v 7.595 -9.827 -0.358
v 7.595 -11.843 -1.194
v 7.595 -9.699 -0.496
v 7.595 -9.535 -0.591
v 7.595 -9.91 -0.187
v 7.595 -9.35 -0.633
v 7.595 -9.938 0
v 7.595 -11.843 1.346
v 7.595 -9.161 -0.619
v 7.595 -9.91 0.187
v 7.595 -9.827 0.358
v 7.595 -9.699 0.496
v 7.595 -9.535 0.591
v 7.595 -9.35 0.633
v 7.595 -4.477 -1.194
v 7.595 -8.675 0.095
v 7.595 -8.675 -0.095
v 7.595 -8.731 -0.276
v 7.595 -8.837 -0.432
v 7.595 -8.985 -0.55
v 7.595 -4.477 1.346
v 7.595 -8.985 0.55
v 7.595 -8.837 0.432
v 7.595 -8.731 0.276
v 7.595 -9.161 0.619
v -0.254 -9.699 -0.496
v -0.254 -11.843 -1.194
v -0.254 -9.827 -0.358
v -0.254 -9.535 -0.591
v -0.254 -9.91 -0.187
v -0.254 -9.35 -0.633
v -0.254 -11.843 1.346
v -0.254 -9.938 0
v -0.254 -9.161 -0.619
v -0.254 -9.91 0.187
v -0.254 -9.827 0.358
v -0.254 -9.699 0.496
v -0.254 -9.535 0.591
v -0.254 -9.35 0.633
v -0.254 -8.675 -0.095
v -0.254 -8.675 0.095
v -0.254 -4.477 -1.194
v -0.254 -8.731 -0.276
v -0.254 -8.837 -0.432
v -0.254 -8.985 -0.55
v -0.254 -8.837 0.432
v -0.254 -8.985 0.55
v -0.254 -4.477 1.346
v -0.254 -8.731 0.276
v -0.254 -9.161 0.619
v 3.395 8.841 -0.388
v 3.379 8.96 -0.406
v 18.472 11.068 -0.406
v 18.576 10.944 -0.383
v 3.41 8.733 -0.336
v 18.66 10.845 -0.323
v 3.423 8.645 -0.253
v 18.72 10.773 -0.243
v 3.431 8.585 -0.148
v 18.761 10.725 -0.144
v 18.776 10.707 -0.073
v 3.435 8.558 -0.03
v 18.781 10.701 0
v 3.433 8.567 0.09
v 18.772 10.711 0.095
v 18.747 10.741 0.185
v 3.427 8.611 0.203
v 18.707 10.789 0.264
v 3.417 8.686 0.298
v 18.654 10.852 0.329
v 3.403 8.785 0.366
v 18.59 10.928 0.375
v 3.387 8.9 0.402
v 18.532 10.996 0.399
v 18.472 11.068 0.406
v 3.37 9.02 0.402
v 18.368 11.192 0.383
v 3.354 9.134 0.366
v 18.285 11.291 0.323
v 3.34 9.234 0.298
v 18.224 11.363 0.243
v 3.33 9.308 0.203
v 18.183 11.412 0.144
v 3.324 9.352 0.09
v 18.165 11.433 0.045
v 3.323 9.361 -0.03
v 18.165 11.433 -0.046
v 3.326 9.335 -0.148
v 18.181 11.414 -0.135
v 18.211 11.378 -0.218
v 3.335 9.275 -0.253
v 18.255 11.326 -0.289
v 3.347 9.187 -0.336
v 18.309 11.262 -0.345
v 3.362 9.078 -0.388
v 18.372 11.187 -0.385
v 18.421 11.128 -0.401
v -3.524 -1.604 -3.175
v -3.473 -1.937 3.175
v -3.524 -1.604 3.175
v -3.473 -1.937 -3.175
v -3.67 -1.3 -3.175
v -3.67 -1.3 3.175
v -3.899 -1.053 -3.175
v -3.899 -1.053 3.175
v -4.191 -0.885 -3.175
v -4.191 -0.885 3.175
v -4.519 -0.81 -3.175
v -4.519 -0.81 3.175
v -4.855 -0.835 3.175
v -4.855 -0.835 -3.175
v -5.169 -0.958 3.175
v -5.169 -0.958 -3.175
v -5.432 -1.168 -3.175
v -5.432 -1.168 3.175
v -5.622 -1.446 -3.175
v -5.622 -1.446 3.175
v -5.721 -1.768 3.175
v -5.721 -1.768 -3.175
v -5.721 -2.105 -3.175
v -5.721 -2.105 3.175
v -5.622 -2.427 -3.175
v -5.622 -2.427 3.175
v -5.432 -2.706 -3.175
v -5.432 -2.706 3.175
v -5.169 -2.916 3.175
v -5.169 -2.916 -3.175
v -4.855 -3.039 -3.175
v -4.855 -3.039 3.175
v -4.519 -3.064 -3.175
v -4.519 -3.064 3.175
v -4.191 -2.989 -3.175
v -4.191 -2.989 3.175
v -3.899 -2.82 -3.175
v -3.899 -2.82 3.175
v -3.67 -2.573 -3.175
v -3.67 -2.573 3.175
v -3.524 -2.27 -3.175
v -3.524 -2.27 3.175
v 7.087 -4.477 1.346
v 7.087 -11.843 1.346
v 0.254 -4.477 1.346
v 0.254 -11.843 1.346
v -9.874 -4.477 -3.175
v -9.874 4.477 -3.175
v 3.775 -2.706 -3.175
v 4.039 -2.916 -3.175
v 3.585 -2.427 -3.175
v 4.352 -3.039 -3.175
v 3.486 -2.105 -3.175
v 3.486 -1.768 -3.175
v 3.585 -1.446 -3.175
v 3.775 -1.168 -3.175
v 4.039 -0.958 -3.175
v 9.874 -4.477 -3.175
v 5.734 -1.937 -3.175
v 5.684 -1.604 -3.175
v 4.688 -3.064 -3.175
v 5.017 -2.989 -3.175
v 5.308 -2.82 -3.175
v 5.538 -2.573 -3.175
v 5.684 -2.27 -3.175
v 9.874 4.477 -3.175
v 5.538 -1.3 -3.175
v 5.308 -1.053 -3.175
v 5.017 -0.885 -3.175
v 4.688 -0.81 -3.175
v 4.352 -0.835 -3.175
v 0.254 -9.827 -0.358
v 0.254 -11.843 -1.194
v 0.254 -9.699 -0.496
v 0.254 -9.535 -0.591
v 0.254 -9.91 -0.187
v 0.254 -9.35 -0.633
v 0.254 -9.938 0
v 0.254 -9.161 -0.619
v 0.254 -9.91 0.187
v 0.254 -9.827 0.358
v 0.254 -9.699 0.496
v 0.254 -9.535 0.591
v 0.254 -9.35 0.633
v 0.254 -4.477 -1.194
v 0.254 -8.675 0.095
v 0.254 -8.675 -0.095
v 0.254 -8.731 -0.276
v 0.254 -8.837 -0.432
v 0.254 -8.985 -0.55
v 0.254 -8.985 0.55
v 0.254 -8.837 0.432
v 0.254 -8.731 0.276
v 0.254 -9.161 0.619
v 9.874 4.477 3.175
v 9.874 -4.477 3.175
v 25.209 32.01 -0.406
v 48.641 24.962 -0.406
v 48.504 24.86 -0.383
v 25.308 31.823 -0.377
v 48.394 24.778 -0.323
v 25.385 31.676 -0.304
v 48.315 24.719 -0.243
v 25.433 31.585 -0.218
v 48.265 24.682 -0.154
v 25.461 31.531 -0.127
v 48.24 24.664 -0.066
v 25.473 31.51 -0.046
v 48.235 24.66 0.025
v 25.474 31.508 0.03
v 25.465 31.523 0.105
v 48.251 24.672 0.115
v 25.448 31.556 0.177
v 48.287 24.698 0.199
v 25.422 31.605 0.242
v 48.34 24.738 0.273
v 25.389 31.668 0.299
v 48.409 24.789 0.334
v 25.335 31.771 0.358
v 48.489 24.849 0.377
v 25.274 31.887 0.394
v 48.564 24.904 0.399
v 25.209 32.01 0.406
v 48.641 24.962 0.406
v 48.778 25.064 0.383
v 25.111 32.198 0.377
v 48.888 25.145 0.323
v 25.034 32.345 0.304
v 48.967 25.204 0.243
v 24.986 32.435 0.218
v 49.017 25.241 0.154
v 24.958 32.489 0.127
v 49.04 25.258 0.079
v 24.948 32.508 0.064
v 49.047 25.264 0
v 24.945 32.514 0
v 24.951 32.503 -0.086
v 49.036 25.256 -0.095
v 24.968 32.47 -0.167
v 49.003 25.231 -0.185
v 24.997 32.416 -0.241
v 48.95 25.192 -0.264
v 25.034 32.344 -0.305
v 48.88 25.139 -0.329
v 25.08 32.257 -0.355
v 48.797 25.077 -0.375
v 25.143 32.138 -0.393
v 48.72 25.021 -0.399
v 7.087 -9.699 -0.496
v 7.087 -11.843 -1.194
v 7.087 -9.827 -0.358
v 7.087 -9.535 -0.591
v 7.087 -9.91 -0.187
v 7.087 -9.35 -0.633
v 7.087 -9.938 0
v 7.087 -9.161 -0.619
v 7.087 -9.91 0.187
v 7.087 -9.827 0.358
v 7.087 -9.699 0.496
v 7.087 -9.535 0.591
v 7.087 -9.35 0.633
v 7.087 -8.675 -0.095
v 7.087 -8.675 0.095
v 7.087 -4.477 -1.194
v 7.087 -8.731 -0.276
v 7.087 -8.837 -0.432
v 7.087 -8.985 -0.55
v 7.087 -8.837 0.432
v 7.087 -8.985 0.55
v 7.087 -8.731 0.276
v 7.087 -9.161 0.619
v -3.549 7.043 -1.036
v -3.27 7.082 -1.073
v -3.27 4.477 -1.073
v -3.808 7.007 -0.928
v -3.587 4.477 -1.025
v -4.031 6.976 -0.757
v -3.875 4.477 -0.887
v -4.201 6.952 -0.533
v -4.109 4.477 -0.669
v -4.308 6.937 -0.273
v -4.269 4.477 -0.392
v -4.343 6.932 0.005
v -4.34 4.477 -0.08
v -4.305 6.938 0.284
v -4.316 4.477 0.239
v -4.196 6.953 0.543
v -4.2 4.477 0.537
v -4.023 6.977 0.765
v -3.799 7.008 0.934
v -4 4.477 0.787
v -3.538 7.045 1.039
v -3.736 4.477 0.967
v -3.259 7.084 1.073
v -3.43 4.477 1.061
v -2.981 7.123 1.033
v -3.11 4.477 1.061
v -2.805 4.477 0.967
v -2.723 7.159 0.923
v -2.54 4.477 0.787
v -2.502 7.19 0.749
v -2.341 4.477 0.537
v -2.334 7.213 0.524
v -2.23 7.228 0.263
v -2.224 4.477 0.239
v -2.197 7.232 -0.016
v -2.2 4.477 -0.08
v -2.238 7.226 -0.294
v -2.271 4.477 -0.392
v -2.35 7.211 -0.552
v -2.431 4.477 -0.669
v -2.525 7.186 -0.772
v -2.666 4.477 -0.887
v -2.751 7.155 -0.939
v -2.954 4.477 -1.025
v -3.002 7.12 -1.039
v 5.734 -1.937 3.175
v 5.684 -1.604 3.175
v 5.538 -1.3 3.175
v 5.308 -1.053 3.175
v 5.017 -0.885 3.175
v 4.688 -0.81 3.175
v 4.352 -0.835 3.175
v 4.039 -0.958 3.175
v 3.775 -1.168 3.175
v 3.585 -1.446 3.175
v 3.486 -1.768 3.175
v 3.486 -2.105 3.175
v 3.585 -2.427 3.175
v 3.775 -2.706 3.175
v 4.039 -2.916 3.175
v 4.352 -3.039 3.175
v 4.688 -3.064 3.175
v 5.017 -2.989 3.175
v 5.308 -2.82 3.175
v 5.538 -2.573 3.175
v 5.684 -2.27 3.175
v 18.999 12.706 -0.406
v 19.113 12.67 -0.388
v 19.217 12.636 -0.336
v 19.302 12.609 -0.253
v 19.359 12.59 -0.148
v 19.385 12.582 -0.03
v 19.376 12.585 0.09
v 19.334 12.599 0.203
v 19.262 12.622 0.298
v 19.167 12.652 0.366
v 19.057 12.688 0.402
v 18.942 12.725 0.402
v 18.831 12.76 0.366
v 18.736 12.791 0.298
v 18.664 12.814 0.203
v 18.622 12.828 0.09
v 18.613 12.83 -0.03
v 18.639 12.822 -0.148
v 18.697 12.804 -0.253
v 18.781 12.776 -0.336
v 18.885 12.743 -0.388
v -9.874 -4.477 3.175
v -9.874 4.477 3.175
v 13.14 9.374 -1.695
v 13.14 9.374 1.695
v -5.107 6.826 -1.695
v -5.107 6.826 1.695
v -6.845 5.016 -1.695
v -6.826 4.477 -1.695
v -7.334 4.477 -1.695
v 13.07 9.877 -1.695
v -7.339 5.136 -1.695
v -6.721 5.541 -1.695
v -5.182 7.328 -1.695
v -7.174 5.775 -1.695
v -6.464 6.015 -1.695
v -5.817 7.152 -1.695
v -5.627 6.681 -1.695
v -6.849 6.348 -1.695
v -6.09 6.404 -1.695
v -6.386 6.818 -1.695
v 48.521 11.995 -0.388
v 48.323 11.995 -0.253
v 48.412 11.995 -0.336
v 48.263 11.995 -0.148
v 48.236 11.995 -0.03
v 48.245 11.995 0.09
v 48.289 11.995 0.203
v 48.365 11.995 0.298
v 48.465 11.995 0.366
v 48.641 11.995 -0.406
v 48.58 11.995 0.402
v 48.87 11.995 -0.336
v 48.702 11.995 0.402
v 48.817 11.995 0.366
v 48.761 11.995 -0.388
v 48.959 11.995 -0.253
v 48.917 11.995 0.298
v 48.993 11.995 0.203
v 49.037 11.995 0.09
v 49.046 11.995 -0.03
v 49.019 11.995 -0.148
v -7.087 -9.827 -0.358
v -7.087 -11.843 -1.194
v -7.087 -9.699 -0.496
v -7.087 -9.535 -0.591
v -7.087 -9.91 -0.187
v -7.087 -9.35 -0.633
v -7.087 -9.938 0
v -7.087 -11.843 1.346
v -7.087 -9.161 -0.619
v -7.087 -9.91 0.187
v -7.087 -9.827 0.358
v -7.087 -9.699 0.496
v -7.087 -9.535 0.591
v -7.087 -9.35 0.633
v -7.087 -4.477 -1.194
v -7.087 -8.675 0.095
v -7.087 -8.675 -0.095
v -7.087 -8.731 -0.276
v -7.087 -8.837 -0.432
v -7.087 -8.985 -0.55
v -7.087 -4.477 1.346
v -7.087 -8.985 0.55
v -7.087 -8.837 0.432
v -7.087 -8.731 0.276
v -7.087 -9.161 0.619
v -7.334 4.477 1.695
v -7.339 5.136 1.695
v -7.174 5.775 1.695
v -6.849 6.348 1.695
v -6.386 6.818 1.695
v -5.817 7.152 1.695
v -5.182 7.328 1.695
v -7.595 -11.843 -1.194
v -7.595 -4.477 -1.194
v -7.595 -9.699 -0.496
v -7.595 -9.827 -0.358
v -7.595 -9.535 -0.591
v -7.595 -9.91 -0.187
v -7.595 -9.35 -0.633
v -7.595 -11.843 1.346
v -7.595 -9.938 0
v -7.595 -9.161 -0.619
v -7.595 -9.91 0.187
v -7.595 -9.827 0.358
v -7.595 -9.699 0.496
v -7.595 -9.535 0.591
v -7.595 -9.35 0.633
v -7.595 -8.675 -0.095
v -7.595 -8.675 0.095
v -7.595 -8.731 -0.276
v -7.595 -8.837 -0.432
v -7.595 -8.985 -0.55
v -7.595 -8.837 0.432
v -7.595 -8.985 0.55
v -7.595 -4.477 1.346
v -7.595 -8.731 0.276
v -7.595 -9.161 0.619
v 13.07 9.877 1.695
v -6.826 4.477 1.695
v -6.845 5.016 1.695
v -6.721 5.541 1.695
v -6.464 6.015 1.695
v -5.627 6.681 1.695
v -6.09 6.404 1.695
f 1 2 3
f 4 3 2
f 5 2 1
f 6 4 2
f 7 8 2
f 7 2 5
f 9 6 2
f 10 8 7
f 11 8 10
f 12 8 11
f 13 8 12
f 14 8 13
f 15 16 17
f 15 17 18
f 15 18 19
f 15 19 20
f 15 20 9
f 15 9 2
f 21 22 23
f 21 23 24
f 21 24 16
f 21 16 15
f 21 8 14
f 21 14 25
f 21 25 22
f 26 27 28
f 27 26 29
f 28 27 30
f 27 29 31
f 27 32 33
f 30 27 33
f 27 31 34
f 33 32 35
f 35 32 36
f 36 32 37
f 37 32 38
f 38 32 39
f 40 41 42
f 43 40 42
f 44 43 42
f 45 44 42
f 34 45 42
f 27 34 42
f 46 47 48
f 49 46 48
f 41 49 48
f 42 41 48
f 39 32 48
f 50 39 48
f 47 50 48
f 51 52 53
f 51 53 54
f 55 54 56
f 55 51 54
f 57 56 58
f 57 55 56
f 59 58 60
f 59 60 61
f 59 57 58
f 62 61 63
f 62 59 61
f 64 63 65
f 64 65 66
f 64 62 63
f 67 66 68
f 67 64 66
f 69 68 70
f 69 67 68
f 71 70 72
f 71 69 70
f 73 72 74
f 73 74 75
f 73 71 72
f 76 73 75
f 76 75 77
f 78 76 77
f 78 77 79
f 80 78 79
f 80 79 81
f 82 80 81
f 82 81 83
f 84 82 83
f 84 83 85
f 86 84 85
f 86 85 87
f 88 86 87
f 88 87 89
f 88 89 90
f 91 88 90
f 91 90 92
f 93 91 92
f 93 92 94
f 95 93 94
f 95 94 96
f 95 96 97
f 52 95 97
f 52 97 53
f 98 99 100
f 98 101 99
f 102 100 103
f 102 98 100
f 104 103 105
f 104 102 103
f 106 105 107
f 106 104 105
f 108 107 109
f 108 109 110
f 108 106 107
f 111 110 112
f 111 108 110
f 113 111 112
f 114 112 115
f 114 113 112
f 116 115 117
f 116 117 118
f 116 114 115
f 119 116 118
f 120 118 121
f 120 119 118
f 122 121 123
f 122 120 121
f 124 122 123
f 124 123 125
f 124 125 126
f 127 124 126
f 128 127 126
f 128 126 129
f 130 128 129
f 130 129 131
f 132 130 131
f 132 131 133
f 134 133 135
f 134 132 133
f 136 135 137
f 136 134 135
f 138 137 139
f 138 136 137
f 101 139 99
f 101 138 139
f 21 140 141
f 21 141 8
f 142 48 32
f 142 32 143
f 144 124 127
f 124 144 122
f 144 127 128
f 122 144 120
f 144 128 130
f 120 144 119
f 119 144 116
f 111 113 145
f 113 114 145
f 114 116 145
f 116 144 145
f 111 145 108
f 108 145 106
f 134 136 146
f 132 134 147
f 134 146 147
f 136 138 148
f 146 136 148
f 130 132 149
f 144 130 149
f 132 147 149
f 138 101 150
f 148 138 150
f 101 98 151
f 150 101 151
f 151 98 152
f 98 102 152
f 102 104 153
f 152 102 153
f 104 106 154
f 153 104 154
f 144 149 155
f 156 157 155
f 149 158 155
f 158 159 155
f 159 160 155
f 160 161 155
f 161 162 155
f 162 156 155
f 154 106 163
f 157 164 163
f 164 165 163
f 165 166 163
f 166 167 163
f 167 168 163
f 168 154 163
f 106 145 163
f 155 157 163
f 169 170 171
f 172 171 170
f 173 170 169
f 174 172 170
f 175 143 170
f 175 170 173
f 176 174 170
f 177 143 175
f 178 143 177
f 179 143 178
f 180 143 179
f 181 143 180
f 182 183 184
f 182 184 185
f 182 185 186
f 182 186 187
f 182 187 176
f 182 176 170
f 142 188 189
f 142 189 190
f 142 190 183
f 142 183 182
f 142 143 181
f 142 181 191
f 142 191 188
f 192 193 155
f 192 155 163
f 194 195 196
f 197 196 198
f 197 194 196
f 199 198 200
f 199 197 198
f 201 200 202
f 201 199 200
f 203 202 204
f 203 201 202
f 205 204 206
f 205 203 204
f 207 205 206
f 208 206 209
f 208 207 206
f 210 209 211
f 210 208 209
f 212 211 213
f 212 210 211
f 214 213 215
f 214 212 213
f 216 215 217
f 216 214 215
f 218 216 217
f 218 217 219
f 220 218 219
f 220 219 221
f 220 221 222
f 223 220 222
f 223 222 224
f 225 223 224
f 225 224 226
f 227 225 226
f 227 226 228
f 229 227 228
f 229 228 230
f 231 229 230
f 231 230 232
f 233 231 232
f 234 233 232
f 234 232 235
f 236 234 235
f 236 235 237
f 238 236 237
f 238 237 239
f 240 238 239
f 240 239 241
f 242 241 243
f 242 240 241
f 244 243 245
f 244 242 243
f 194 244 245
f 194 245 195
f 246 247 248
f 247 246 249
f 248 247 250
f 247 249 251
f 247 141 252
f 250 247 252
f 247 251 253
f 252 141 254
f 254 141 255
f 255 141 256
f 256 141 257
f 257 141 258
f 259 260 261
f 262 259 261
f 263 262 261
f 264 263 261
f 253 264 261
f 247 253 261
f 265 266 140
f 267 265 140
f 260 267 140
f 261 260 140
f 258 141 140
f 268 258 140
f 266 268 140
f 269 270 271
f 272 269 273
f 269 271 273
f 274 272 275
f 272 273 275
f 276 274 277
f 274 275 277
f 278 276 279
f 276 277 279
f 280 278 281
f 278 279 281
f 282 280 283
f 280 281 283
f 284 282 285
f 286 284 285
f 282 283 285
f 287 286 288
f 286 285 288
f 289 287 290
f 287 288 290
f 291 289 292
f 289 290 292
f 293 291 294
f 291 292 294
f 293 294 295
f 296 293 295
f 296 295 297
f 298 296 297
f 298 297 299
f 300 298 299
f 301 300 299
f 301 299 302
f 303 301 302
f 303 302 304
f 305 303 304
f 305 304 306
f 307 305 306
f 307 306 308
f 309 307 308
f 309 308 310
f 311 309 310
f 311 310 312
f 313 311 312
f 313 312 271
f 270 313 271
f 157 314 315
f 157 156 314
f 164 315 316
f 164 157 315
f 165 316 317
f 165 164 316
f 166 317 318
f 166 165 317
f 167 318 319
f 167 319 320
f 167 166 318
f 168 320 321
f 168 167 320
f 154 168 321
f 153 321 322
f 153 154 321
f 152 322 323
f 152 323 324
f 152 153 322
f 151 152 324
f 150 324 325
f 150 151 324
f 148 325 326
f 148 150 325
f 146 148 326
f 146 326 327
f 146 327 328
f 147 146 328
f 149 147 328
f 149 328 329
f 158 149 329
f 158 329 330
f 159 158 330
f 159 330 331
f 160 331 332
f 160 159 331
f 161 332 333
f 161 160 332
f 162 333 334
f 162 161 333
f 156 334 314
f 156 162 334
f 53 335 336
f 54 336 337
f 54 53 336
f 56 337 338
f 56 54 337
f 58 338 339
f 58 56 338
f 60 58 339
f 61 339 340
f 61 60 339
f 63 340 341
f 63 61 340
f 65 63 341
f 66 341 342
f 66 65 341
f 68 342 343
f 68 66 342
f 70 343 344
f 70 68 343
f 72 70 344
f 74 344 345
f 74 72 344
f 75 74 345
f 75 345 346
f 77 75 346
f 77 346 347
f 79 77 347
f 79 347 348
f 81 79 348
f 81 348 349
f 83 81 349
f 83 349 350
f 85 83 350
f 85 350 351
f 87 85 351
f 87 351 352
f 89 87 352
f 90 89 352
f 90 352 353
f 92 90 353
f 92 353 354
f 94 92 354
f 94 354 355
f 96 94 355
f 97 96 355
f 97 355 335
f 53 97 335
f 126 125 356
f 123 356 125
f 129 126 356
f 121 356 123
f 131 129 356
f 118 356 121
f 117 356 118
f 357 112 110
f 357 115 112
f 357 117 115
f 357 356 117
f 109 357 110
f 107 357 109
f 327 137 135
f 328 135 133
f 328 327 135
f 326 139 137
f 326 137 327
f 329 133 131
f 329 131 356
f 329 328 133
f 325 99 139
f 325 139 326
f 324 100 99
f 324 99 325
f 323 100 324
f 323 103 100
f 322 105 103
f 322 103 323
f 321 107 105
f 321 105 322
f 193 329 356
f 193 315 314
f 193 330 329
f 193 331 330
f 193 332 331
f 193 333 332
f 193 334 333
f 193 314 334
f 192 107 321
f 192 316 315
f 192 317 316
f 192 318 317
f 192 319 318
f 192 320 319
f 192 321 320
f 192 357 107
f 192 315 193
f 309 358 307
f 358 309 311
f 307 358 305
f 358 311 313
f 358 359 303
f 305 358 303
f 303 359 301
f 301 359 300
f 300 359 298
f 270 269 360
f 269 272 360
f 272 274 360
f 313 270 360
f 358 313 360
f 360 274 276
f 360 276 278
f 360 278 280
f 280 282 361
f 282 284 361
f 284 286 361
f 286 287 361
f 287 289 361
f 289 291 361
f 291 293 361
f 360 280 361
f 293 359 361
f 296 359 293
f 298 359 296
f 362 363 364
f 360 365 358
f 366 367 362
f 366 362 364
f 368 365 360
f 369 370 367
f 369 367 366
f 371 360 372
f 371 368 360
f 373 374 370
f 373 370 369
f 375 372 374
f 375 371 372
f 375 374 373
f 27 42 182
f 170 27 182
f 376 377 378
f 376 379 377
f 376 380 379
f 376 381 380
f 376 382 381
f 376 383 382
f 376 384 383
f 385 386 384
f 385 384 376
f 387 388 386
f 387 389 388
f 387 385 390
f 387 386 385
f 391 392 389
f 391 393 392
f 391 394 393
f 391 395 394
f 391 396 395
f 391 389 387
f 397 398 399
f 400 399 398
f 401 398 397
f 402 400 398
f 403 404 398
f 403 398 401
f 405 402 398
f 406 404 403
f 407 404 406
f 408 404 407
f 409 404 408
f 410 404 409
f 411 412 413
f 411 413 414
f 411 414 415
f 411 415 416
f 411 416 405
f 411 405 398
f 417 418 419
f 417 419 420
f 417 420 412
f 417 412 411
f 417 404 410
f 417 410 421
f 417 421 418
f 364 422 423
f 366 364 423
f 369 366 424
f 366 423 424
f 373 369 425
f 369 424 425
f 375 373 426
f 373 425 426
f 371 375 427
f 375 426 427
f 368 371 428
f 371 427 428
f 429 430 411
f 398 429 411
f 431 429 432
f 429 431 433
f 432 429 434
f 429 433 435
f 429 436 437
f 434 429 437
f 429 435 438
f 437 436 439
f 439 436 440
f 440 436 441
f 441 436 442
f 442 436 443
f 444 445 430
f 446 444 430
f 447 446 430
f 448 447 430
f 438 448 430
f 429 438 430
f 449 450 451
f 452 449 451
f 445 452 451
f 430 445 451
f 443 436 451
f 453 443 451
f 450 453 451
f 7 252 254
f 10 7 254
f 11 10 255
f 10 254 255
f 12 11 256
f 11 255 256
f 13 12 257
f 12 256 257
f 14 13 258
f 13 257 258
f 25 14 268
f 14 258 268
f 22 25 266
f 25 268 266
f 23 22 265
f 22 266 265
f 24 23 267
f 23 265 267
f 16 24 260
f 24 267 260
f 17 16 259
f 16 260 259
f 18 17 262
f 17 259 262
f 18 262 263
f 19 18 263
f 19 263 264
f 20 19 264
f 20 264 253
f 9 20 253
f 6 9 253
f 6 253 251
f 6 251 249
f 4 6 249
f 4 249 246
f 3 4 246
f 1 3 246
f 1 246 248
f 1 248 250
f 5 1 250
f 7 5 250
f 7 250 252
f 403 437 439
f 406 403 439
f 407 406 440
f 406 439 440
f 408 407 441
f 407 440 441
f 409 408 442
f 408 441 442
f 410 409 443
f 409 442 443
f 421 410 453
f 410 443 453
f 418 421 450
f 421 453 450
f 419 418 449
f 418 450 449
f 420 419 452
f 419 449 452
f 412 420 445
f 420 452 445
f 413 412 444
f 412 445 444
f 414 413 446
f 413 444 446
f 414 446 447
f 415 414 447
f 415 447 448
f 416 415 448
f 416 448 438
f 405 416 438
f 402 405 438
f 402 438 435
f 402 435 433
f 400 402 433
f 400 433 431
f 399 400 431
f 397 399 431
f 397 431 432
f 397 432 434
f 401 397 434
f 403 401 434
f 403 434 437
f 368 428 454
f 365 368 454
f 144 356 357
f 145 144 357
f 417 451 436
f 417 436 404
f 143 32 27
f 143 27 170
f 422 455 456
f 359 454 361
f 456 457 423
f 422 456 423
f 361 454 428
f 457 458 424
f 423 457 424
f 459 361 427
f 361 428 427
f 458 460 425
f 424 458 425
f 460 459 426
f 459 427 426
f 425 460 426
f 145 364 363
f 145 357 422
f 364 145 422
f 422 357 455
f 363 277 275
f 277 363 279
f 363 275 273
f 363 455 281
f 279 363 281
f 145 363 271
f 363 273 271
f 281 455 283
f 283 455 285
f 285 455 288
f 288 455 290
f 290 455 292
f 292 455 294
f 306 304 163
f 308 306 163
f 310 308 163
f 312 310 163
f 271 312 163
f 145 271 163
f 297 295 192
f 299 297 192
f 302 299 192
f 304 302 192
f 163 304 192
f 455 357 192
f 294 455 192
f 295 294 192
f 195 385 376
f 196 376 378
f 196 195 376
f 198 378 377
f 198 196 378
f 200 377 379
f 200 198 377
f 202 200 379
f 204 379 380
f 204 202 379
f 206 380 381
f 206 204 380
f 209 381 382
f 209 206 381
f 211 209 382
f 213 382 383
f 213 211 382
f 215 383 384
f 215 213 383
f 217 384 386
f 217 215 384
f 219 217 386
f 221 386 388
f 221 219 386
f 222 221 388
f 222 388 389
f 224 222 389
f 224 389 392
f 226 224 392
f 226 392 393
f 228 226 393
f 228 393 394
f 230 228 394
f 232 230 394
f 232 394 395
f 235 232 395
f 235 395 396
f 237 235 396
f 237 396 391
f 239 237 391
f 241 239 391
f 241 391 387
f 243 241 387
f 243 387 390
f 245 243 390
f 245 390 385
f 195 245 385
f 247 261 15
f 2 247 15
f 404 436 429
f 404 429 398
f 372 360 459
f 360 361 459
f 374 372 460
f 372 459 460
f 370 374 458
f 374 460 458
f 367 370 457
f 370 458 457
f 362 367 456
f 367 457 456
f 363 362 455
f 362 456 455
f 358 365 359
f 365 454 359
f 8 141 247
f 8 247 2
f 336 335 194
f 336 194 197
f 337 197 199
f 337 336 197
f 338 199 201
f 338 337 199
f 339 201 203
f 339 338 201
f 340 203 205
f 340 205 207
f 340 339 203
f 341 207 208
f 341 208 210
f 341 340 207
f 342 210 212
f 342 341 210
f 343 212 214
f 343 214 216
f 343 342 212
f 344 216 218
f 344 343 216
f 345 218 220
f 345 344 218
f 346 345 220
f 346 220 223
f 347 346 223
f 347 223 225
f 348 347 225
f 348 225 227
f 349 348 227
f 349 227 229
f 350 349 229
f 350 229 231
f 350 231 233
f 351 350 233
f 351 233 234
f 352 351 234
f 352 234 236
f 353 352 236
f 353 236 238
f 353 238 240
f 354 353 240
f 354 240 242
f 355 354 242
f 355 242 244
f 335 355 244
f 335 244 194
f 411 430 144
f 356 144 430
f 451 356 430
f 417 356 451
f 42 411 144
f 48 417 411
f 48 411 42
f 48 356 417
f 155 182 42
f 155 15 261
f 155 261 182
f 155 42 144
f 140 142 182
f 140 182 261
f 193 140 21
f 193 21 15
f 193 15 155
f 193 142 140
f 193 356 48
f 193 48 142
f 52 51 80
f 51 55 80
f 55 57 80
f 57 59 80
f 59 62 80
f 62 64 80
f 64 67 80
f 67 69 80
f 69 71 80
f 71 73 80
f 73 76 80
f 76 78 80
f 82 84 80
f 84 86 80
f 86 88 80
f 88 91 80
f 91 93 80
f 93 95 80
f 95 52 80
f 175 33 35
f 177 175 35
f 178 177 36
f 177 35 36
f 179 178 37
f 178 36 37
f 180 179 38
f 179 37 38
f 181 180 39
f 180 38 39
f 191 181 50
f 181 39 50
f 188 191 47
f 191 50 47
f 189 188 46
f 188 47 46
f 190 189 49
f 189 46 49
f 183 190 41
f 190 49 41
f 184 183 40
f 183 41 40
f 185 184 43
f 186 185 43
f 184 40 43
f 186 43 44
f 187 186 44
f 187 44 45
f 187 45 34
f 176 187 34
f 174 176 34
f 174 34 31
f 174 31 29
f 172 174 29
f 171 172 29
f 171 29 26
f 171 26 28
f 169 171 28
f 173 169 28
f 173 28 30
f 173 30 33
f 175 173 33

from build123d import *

# Parameters (mm, degrees)
SKETCH1_W           = 19.7485
SKETCH1_H           = 8.9535
SKETCH1_R           = 1.1303
BOSS_EXTRUDE1_DEPTH = 3.175
SKETCH2_W           = 0.508
SKETCH2_H           = 7.366
BOSS_EXTRUDE2_DEPTH = 2.54
SKETCH3_R           = 0.635
CUT_EXTRUDE1_DEPTH  = 22.342260257
BOSS_EXTRUDE3_DEPTH = 1.69545
BOSS_EXTRUDE4_REACH = 23.191
SKETCH5_R           = 1.07315
SKETCH7_R           = 0.4064


with BuildPart() as part:
    # Sketch1 → Boss-Extrude1 (new, symmetric)
    with BuildSketch(Plane.XY):
        Rectangle(SKETCH1_W, SKETCH1_H)
        with Locations((-4.60375, -1.93675)):
            Circle(SKETCH1_R, mode=Mode.SUBTRACT)
        with Locations((4.60375, -1.93675)):
            Circle(SKETCH1_R, mode=Mode.SUBTRACT)
    extrude(amount=BOSS_EXTRUDE1_DEPTH, both=True)

    # Sketch2 → Boss-Extrude2 (add)
    with BuildSketch(Plane.XY.offset(1.3462)):
        with Locations((-7.3406, -8.15975)):
            Rectangle(SKETCH2_W, SKETCH2_H)
        with Locations((0, -8.15975)):
            Rectangle(SKETCH2_W, SKETCH2_H)
        with Locations((7.3406, -8.15975)):
            Rectangle(SKETCH2_W, SKETCH2_H)
    extrude(amount=-BOSS_EXTRUDE2_DEPTH)

    # Sketch3 → Cut-Extrude1 (cut, through all)
    with BuildSketch(Plane.ZY.offset(7.5946)):
        with Locations(Location((0, -9.30275, 0), (0, 0, 270))):
            Circle(SKETCH3_R)
    extrude(amount=-CUT_EXTRUDE1_DEPTH, mode=Mode.SUBTRACT)

    # Sketch4 → Boss-Extrude3 (add, symmetric)
    with BuildSketch(Plane.XY):
        with BuildLine():
            Line((-5.181756672, 7.328171185), (13.069818987, 9.877482256))
            Line((13.069818987, 9.877482256), (13.140092321, 9.374366307))
            Line((13.140092321, 9.374366307), (-5.107440727, 6.825619892))
            ThreePointArc((-5.107440727, 6.825619892), (-6.463591279, 6.014683788), (-6.82625, 4.47675))
            Line((-6.82625, 4.47675), (-7.33425, 4.47675))
            ThreePointArc((-7.33425, 4.47675), (-6.848552, 6.348256557), (-5.181756672, 7.328171185))
        make_face()
    extrude(amount=BOSS_EXTRUDE3_DEPTH, both=True)

    # Boss-Extrude4: up to this plane
    boss_extrude4_end = Plane(origin=(13.140092321, 9.374366307, 1.69545), z_dir=(-0.13833333333333328, 0.9903857273249089, 0))
    # Sketch5 → Boss-Extrude4 (add, up to the surface)
    with BuildSketch(Plane(origin=(0, 4.47675, 0), x_dir=(1, 0, 0), z_dir=(0, 1, 0)), mode=Mode.PRIVATE) as boss_extrude4_sk1:
        with Locations(Location((-3.27025, 0, 0), (0, 0, 90))):
            Circle(SKETCH5_R)
    boss_extrude4_tool1 = split(extrude(boss_extrude4_sk1.sketch, amount=BOSS_EXTRUDE4_REACH, mode=Mode.PRIVATE), bisect_by=boss_extrude4_end, keep=Keep.BOTH, mode=Mode.PRIVATE)
    add(boss_extrude4_tool1.solids().sort_by_distance((-3.27025, 4.47675, 0))[0])


with BuildPart() as body_2:
    # Sweep1: sweep along a path in Sketch6
    with BuildLine(Plane.XY) as sweep1_path:
        Line((48.641, 11.99515), (48.641, 24.96185))
        Line((48.641, 24.96185), (25.2095, 32.01035))
        Line((25.2095, 32.01035), (18.9992, 12.70635))
        Line((18.9992, 12.70635), (18.472141645, 11.06805))
        Line((18.472141645, 11.06805), (3.37866316, 8.95985))
    # Sketch7 → Sweep1 (sweep)
    with BuildSketch(Plane(origin=(4.541538232, 0.634344887, 0), x_dir=(0, 0, -1), z_dir=(0.9903857273249097, 0.13833333333332826, 0))):
        with Locations((0, 8.406325822)):
            Circle(SKETCH7_R)
    sweep(path=sweep1_path.line, transition=Transition.RIGHT)


solid = Compound([part.part, body_2.part])
